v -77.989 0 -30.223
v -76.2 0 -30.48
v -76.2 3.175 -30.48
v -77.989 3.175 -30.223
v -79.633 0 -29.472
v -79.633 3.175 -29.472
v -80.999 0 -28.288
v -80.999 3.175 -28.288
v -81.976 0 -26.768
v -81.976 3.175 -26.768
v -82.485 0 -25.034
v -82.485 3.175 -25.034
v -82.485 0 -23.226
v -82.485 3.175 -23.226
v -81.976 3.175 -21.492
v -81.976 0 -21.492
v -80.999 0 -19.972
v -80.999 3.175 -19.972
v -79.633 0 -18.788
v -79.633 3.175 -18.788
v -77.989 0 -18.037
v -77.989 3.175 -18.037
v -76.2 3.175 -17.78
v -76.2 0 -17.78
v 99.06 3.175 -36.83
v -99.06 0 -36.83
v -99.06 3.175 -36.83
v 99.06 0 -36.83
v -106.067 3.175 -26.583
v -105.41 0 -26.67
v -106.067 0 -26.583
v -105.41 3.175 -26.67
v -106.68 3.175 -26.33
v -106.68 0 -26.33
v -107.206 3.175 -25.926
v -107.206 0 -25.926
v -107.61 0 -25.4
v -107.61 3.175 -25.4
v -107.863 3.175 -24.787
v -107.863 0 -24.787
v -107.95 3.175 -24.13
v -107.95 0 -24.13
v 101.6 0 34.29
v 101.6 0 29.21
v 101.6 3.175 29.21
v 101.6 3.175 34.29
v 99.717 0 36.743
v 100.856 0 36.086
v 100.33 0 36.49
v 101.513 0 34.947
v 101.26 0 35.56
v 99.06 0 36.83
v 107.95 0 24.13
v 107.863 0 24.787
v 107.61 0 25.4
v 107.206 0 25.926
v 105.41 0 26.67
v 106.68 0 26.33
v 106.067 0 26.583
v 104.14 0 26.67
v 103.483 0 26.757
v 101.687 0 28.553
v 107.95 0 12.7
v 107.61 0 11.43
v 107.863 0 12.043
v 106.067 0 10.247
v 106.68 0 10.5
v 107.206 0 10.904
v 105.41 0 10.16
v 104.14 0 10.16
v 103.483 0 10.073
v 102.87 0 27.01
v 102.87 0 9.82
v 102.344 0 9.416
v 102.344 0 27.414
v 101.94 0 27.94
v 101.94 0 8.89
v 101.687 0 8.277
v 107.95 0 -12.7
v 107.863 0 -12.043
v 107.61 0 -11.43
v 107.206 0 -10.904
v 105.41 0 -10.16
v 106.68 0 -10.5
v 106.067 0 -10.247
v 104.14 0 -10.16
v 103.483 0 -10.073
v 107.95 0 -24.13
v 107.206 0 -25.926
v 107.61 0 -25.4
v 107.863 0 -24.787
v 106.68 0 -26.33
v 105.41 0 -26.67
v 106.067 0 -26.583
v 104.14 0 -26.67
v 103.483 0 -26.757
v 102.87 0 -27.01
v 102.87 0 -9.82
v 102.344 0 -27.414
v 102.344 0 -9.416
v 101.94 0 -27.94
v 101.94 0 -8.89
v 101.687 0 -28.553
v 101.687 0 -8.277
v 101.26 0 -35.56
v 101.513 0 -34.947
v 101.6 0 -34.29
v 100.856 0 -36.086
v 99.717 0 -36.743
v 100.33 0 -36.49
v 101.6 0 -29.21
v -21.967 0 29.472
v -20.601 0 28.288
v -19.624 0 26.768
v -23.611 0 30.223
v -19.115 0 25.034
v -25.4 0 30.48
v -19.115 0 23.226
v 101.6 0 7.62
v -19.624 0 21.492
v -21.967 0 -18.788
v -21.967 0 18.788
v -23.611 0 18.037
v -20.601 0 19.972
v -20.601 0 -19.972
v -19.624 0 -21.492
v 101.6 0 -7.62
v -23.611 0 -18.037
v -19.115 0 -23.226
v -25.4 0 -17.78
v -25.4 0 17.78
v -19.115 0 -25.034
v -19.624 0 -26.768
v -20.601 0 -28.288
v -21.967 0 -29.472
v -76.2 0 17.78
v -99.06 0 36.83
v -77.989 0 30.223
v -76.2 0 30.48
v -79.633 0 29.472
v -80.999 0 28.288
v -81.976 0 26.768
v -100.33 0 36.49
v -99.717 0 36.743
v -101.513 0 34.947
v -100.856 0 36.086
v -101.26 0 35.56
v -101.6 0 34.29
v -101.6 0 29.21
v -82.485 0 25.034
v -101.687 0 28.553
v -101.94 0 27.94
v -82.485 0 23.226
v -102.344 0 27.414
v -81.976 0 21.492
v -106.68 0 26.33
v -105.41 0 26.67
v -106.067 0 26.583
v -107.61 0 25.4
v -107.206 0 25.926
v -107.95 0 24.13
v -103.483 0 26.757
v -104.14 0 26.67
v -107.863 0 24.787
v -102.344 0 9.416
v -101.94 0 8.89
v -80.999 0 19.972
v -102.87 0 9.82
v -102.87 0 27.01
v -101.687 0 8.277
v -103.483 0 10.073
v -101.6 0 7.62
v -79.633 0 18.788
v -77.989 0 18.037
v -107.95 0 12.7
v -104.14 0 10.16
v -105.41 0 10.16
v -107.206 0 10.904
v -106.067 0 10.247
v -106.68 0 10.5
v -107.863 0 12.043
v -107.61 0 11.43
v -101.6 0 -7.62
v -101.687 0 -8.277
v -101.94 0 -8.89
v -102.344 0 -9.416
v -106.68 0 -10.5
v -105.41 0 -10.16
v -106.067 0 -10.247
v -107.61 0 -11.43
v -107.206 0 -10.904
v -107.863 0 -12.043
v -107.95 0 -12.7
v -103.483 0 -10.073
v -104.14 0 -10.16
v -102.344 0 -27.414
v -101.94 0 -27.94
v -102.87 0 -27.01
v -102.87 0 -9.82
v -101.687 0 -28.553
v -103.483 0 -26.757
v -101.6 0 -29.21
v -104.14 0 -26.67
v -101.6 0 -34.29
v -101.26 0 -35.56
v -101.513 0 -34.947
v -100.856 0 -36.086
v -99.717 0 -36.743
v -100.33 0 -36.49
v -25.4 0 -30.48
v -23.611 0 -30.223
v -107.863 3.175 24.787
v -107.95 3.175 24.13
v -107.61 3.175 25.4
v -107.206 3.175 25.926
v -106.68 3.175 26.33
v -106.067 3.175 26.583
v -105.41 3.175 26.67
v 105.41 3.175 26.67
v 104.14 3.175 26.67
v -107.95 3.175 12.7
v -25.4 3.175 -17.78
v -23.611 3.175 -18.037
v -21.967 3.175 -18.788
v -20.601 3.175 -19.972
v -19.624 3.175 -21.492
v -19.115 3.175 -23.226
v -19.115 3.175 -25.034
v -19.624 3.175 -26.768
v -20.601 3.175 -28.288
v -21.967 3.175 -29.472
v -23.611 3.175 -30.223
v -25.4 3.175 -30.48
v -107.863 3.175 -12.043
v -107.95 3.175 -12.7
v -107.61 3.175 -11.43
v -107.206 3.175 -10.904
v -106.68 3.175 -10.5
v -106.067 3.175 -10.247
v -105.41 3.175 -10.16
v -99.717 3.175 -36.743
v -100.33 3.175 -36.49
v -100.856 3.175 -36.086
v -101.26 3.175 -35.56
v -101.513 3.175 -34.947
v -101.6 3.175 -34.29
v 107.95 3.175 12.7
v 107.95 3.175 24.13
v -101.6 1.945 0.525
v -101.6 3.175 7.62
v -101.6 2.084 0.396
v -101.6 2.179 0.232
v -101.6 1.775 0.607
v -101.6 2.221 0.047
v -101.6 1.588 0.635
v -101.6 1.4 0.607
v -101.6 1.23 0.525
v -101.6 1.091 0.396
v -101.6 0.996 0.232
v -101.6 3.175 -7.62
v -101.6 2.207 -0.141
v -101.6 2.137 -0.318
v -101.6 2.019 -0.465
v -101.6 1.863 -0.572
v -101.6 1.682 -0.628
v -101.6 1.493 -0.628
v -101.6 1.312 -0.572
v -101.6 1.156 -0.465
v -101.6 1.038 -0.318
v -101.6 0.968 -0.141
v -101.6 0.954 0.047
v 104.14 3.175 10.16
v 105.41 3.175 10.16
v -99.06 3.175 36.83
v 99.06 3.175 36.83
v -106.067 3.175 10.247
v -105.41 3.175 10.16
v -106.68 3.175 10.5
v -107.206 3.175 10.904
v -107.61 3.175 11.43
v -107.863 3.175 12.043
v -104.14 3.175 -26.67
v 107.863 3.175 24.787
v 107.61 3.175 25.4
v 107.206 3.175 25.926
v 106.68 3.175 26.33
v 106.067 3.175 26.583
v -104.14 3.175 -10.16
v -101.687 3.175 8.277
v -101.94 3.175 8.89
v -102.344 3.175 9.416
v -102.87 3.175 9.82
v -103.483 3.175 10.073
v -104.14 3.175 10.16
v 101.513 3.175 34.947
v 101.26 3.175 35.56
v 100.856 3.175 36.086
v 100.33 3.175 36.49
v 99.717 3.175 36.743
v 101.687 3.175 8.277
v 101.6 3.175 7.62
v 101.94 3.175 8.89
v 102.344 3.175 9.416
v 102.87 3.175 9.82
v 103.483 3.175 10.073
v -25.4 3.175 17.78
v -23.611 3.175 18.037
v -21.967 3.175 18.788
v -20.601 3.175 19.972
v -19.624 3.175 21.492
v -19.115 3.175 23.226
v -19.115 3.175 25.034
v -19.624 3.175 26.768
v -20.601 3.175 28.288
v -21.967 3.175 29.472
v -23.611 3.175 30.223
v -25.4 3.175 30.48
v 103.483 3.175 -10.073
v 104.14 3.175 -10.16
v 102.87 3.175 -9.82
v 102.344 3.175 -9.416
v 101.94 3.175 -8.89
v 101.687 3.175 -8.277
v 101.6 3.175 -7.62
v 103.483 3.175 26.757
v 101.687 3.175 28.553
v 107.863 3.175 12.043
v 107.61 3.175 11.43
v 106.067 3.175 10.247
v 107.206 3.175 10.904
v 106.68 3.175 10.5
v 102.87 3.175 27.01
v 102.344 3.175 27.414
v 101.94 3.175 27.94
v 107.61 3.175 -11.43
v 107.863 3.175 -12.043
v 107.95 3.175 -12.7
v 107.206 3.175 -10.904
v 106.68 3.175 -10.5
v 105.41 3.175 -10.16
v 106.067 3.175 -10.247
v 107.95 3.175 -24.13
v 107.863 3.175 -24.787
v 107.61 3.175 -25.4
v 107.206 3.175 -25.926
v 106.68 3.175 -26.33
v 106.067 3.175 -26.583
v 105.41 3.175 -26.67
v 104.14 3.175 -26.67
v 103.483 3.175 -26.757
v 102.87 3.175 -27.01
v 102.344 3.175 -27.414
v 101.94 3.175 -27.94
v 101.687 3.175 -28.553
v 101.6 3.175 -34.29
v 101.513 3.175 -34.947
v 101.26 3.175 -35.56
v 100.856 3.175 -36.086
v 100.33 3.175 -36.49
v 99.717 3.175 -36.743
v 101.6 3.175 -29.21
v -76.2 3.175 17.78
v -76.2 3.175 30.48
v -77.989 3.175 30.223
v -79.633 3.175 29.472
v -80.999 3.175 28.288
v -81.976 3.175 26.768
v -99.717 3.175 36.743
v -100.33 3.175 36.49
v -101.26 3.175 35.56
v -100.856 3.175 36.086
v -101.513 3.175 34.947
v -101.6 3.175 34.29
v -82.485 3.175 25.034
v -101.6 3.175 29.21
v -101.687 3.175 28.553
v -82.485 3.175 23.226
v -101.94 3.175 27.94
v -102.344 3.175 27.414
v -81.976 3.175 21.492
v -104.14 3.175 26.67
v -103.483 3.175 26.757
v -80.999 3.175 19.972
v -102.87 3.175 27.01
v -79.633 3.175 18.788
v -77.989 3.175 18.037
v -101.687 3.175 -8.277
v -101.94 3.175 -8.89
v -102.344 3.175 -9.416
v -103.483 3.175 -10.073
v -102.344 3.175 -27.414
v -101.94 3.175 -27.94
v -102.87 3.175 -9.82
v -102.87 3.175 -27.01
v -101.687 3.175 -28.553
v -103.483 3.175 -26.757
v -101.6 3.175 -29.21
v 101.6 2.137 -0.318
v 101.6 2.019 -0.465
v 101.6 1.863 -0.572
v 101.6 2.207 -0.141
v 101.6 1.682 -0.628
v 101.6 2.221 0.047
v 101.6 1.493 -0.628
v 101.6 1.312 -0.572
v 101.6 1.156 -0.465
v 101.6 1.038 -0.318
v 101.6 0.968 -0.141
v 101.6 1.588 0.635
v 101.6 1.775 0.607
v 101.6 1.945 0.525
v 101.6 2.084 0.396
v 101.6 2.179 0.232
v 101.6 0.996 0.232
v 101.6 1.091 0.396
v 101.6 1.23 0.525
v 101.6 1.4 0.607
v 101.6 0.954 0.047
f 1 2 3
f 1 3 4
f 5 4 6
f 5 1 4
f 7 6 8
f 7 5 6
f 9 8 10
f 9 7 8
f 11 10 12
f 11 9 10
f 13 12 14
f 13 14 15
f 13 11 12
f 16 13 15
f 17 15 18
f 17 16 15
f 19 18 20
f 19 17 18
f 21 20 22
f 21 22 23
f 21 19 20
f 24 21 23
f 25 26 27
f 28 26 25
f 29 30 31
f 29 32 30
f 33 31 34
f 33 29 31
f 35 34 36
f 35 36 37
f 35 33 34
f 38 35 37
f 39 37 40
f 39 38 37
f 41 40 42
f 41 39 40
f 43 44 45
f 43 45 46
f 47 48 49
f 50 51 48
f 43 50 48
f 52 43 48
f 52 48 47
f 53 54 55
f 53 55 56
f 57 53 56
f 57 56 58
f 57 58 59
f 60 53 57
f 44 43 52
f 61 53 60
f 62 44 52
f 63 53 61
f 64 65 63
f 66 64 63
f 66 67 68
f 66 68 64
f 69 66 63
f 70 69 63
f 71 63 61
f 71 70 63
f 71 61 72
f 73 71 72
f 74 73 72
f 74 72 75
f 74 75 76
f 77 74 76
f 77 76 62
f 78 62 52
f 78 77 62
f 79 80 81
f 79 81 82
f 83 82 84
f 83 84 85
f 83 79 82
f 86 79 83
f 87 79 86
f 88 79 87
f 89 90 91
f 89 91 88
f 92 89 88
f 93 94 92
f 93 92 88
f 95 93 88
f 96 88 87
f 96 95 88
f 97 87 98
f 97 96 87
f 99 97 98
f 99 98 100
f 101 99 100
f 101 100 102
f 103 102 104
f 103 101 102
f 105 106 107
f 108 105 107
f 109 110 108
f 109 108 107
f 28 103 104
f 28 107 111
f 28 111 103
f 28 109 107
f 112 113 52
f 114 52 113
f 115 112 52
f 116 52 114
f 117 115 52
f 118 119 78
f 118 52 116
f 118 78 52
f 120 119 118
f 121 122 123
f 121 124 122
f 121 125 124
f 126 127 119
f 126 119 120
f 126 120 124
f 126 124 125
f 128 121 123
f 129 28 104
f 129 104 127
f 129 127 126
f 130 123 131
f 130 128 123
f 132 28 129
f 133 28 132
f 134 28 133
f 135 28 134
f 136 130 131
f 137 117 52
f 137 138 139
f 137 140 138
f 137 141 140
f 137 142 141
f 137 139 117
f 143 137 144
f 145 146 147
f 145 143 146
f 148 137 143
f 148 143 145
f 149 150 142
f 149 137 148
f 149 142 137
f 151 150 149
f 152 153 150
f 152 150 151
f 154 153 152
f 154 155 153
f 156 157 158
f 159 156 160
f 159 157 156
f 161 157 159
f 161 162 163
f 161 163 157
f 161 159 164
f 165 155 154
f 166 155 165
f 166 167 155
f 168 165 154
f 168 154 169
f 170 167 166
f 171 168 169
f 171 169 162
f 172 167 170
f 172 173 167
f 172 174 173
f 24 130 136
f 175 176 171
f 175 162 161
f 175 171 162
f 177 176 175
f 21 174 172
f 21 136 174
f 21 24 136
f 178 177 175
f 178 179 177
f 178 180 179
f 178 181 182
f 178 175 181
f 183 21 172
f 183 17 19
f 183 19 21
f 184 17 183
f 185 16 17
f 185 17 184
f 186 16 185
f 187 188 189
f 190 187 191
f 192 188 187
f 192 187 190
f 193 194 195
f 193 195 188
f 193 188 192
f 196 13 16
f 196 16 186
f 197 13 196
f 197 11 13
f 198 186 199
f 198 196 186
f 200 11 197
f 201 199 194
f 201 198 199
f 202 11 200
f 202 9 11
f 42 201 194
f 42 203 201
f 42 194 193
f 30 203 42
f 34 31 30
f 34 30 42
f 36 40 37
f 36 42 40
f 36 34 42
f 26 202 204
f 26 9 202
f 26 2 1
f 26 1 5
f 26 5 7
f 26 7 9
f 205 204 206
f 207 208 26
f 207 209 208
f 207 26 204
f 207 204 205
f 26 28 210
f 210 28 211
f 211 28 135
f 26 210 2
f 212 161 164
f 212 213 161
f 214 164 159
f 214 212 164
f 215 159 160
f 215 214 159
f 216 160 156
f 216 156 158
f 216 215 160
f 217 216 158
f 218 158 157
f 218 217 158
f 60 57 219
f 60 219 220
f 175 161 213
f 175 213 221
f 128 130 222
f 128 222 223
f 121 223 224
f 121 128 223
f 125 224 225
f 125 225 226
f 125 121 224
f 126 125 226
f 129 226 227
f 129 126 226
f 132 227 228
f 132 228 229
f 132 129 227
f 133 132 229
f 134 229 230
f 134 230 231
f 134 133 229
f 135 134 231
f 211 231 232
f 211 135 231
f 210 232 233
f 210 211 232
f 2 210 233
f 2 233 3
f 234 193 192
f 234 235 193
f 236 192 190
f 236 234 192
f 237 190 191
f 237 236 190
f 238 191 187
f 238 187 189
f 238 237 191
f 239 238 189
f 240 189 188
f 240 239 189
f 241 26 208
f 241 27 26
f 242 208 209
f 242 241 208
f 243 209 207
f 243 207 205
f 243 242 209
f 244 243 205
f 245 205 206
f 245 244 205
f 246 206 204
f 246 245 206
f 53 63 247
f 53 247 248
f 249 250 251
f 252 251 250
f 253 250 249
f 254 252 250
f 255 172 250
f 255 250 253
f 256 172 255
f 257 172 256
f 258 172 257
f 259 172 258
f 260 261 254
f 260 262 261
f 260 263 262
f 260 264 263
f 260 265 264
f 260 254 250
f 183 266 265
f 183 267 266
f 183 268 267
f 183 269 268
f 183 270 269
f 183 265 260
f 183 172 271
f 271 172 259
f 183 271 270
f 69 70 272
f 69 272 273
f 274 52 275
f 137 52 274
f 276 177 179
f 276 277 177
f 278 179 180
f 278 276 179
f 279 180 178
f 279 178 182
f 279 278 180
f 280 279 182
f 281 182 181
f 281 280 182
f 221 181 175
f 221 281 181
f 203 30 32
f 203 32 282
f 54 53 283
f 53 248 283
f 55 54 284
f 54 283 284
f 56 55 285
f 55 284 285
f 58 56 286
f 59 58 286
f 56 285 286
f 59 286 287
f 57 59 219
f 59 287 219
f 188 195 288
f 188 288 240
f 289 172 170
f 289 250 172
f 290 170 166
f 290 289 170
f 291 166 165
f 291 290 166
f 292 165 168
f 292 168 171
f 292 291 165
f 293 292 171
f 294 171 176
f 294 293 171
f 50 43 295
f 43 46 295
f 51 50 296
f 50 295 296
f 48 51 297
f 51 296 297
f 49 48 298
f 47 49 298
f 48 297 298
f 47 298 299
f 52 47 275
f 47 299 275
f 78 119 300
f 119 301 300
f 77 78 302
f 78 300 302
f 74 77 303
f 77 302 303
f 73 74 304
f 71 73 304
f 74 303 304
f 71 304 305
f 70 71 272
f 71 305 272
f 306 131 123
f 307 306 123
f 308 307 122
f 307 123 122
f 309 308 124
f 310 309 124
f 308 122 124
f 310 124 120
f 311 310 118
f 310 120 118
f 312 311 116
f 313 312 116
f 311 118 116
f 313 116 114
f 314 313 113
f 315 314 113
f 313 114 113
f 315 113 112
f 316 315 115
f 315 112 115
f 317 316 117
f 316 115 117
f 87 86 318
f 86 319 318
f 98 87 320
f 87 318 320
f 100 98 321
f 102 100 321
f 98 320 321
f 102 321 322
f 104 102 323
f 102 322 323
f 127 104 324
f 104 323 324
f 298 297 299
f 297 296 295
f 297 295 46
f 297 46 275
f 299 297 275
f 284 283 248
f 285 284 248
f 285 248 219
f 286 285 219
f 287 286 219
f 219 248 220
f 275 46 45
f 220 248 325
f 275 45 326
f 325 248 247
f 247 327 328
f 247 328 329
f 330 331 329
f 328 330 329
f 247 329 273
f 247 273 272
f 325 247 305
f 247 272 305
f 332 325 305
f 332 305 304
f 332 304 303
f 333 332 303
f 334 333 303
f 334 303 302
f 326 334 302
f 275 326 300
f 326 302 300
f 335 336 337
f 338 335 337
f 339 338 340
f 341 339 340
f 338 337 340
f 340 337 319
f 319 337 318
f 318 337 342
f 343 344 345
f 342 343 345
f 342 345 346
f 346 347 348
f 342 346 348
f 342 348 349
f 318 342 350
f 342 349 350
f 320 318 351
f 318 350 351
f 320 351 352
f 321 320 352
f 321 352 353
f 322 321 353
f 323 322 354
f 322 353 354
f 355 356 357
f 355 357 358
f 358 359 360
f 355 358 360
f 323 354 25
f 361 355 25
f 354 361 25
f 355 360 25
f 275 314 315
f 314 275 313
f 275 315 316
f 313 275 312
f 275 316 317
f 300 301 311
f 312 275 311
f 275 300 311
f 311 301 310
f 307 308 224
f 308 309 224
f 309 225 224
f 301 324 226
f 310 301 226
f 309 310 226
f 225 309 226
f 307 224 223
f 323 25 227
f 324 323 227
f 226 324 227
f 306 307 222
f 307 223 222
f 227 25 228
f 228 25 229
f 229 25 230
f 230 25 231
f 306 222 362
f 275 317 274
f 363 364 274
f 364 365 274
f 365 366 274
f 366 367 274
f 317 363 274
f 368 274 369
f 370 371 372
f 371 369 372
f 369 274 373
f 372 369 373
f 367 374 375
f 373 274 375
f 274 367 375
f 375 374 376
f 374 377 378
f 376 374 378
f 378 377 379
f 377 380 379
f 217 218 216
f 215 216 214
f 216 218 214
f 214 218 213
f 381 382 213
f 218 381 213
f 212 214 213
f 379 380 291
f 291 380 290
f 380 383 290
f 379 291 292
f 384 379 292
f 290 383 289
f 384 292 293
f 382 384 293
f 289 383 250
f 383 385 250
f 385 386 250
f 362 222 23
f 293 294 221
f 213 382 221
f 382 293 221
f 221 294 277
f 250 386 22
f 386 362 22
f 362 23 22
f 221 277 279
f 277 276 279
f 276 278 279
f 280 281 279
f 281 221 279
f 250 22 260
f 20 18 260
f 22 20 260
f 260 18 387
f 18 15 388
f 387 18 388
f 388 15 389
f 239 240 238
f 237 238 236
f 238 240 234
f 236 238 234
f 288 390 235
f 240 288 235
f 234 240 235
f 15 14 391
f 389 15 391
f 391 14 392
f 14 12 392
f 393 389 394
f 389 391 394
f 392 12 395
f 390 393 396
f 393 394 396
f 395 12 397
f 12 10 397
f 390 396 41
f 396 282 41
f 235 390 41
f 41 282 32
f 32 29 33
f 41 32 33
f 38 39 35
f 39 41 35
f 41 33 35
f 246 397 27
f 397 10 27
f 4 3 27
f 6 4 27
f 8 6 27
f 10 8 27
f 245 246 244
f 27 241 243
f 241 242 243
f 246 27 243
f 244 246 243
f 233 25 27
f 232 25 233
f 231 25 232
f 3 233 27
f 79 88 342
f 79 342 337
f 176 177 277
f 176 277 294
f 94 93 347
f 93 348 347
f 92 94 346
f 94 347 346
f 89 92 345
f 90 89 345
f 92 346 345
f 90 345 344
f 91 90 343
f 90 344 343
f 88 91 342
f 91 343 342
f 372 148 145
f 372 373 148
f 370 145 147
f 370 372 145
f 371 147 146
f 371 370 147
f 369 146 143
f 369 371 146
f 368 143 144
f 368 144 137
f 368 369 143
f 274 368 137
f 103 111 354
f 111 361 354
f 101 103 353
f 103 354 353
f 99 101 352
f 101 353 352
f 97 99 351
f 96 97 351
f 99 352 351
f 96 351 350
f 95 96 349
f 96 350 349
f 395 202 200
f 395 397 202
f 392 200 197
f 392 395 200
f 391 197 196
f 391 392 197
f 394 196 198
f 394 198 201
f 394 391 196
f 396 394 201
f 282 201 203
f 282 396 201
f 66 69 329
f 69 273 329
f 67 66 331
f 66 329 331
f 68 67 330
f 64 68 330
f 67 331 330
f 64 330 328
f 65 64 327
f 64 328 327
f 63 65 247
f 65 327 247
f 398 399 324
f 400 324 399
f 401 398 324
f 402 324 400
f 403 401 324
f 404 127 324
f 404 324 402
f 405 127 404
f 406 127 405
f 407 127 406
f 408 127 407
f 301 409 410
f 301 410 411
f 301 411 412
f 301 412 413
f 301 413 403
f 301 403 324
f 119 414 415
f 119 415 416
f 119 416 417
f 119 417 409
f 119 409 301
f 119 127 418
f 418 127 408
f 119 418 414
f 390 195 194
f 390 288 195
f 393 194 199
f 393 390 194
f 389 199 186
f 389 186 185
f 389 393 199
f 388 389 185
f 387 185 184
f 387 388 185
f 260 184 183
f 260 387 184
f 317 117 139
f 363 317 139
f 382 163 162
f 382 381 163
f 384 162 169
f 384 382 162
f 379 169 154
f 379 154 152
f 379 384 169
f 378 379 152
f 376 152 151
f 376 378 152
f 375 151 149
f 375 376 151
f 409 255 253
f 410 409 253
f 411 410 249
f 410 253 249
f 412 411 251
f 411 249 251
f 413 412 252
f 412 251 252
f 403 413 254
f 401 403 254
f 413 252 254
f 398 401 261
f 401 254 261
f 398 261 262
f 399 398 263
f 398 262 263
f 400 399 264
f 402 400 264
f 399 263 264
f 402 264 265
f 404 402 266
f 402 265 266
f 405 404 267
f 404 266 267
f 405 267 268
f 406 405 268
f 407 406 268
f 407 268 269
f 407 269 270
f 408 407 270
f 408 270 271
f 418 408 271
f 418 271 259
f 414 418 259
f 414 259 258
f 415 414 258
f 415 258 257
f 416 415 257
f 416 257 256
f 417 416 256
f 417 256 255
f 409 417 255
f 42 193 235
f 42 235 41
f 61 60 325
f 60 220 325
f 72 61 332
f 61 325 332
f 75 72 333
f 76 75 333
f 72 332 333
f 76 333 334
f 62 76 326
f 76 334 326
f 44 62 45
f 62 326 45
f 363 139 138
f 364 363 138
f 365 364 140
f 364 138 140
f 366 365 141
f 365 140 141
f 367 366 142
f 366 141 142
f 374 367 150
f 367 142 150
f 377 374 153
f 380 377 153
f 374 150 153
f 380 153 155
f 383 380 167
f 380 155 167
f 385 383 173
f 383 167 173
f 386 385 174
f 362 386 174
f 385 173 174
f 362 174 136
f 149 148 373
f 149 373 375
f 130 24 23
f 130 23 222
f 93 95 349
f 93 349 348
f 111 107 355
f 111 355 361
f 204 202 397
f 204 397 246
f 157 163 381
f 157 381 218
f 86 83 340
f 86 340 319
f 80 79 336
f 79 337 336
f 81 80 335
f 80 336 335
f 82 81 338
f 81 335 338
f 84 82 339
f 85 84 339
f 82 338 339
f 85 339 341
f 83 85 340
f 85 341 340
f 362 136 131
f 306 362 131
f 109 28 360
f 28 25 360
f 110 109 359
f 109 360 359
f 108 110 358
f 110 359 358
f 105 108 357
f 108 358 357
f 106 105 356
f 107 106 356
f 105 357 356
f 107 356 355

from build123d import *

# Parameters (mm, degrees)
BOSS_EXTRUDE1_DEPTH = 3.175
FILLET1_R           = 2.54
SKETCH3_R           = 0.635
CUT_EXTRUDE1_DEPTH  = 213.785648071


with BuildPart() as part:
    # Sketch1 → Boss-Extrude1 (new body)
    with BuildSketch(Plane(origin=(0, 0, 0), x_dir=(1, 0, 0), z_dir=(0, 1, 0))):
        Polygon((-101.6, 36.83), (101.6, 36.83), (101.6, 26.67), (107.95, 26.67), (107.95, 10.16), (101.6, 10.16), (101.6, -10.16), (107.95, -10.16), (107.95, -26.67), (101.6, -26.67), (101.6, -36.83), (-101.6, -36.83), (-101.6, -26.67), (-107.95, -26.67), (-107.95, -10.16), (-101.6, -10.16), (-101.6, 10.16), (-107.95, 10.16), (-107.95, 26.67), (-101.6, 26.67), align=None)
        with BuildLine():
            Line((-76.2, -17.78), (-25.4, -17.78))
            ThreePointArc((-25.4, -17.78), (-19.05, -24.13), (-25.4, -30.48))
            Line((-25.4, -30.48), (-76.2, -30.48))
            ThreePointArc((-76.2, -30.48), (-82.55, -24.13), (-76.2, -17.78))
        make_face(mode=Mode.SUBTRACT)
        with BuildLine():
            Line((-76.2, 17.78), (-25.4, 17.78))
            ThreePointArc((-25.4, 17.78), (-19.05, 24.13), (-25.4, 30.48))
            Line((-25.4, 30.48), (-76.2, 30.48))
            ThreePointArc((-76.2, 30.48), (-82.55, 24.13), (-76.2, 17.78))
        make_face(mode=Mode.SUBTRACT)
    extrude(amount=BOSS_EXTRUDE1_DEPTH)

    # Fillet1
    fillet1_edges = [part.edges().sort_by_distance(p)[0] for p in [
        (101.6, 1.5875, 36.83),
        (-101.6, 1.5875, 36.83),
        (-101.6, 1.5875, 26.67),
        (-107.95, 1.5875, 26.67),
        (-107.95, 1.5875, 10.16),
        (-101.6, 1.5875, 10.16),
        (-101.6, 1.5875, -10.16),
        (-107.95, 1.5875, -10.16),
        (-107.95, 1.5875, -26.67),
        (-101.6, 1.5875, -26.67),
        (-101.6, 1.5875, -36.83),
        (101.6, 1.5875, -36.83),
        (101.6, 1.5875, -26.67),
        (107.95, 1.5875, -26.67),
        (107.95, 1.5875, -10.16),
        (101.6, 1.5875, -10.16),
        (101.6, 1.5875, 10.16),
        (107.95, 1.5875, 10.16),
        (107.95, 1.5875, 26.67),
        (101.6, 1.5875, 26.67),
    ]]
    fillet(fillet1_edges, radius=FILLET1_R)

    # Sketch3 → Cut-Extrude1 (cut, through all)
    with BuildSketch(Plane.ZY.offset(101.6)):
        with Locations((0, 1.5875)):
            Circle(SKETCH3_R)
    extrude(amount=-CUT_EXTRUDE1_DEPTH, mode=Mode.SUBTRACT)


solid = part.part
